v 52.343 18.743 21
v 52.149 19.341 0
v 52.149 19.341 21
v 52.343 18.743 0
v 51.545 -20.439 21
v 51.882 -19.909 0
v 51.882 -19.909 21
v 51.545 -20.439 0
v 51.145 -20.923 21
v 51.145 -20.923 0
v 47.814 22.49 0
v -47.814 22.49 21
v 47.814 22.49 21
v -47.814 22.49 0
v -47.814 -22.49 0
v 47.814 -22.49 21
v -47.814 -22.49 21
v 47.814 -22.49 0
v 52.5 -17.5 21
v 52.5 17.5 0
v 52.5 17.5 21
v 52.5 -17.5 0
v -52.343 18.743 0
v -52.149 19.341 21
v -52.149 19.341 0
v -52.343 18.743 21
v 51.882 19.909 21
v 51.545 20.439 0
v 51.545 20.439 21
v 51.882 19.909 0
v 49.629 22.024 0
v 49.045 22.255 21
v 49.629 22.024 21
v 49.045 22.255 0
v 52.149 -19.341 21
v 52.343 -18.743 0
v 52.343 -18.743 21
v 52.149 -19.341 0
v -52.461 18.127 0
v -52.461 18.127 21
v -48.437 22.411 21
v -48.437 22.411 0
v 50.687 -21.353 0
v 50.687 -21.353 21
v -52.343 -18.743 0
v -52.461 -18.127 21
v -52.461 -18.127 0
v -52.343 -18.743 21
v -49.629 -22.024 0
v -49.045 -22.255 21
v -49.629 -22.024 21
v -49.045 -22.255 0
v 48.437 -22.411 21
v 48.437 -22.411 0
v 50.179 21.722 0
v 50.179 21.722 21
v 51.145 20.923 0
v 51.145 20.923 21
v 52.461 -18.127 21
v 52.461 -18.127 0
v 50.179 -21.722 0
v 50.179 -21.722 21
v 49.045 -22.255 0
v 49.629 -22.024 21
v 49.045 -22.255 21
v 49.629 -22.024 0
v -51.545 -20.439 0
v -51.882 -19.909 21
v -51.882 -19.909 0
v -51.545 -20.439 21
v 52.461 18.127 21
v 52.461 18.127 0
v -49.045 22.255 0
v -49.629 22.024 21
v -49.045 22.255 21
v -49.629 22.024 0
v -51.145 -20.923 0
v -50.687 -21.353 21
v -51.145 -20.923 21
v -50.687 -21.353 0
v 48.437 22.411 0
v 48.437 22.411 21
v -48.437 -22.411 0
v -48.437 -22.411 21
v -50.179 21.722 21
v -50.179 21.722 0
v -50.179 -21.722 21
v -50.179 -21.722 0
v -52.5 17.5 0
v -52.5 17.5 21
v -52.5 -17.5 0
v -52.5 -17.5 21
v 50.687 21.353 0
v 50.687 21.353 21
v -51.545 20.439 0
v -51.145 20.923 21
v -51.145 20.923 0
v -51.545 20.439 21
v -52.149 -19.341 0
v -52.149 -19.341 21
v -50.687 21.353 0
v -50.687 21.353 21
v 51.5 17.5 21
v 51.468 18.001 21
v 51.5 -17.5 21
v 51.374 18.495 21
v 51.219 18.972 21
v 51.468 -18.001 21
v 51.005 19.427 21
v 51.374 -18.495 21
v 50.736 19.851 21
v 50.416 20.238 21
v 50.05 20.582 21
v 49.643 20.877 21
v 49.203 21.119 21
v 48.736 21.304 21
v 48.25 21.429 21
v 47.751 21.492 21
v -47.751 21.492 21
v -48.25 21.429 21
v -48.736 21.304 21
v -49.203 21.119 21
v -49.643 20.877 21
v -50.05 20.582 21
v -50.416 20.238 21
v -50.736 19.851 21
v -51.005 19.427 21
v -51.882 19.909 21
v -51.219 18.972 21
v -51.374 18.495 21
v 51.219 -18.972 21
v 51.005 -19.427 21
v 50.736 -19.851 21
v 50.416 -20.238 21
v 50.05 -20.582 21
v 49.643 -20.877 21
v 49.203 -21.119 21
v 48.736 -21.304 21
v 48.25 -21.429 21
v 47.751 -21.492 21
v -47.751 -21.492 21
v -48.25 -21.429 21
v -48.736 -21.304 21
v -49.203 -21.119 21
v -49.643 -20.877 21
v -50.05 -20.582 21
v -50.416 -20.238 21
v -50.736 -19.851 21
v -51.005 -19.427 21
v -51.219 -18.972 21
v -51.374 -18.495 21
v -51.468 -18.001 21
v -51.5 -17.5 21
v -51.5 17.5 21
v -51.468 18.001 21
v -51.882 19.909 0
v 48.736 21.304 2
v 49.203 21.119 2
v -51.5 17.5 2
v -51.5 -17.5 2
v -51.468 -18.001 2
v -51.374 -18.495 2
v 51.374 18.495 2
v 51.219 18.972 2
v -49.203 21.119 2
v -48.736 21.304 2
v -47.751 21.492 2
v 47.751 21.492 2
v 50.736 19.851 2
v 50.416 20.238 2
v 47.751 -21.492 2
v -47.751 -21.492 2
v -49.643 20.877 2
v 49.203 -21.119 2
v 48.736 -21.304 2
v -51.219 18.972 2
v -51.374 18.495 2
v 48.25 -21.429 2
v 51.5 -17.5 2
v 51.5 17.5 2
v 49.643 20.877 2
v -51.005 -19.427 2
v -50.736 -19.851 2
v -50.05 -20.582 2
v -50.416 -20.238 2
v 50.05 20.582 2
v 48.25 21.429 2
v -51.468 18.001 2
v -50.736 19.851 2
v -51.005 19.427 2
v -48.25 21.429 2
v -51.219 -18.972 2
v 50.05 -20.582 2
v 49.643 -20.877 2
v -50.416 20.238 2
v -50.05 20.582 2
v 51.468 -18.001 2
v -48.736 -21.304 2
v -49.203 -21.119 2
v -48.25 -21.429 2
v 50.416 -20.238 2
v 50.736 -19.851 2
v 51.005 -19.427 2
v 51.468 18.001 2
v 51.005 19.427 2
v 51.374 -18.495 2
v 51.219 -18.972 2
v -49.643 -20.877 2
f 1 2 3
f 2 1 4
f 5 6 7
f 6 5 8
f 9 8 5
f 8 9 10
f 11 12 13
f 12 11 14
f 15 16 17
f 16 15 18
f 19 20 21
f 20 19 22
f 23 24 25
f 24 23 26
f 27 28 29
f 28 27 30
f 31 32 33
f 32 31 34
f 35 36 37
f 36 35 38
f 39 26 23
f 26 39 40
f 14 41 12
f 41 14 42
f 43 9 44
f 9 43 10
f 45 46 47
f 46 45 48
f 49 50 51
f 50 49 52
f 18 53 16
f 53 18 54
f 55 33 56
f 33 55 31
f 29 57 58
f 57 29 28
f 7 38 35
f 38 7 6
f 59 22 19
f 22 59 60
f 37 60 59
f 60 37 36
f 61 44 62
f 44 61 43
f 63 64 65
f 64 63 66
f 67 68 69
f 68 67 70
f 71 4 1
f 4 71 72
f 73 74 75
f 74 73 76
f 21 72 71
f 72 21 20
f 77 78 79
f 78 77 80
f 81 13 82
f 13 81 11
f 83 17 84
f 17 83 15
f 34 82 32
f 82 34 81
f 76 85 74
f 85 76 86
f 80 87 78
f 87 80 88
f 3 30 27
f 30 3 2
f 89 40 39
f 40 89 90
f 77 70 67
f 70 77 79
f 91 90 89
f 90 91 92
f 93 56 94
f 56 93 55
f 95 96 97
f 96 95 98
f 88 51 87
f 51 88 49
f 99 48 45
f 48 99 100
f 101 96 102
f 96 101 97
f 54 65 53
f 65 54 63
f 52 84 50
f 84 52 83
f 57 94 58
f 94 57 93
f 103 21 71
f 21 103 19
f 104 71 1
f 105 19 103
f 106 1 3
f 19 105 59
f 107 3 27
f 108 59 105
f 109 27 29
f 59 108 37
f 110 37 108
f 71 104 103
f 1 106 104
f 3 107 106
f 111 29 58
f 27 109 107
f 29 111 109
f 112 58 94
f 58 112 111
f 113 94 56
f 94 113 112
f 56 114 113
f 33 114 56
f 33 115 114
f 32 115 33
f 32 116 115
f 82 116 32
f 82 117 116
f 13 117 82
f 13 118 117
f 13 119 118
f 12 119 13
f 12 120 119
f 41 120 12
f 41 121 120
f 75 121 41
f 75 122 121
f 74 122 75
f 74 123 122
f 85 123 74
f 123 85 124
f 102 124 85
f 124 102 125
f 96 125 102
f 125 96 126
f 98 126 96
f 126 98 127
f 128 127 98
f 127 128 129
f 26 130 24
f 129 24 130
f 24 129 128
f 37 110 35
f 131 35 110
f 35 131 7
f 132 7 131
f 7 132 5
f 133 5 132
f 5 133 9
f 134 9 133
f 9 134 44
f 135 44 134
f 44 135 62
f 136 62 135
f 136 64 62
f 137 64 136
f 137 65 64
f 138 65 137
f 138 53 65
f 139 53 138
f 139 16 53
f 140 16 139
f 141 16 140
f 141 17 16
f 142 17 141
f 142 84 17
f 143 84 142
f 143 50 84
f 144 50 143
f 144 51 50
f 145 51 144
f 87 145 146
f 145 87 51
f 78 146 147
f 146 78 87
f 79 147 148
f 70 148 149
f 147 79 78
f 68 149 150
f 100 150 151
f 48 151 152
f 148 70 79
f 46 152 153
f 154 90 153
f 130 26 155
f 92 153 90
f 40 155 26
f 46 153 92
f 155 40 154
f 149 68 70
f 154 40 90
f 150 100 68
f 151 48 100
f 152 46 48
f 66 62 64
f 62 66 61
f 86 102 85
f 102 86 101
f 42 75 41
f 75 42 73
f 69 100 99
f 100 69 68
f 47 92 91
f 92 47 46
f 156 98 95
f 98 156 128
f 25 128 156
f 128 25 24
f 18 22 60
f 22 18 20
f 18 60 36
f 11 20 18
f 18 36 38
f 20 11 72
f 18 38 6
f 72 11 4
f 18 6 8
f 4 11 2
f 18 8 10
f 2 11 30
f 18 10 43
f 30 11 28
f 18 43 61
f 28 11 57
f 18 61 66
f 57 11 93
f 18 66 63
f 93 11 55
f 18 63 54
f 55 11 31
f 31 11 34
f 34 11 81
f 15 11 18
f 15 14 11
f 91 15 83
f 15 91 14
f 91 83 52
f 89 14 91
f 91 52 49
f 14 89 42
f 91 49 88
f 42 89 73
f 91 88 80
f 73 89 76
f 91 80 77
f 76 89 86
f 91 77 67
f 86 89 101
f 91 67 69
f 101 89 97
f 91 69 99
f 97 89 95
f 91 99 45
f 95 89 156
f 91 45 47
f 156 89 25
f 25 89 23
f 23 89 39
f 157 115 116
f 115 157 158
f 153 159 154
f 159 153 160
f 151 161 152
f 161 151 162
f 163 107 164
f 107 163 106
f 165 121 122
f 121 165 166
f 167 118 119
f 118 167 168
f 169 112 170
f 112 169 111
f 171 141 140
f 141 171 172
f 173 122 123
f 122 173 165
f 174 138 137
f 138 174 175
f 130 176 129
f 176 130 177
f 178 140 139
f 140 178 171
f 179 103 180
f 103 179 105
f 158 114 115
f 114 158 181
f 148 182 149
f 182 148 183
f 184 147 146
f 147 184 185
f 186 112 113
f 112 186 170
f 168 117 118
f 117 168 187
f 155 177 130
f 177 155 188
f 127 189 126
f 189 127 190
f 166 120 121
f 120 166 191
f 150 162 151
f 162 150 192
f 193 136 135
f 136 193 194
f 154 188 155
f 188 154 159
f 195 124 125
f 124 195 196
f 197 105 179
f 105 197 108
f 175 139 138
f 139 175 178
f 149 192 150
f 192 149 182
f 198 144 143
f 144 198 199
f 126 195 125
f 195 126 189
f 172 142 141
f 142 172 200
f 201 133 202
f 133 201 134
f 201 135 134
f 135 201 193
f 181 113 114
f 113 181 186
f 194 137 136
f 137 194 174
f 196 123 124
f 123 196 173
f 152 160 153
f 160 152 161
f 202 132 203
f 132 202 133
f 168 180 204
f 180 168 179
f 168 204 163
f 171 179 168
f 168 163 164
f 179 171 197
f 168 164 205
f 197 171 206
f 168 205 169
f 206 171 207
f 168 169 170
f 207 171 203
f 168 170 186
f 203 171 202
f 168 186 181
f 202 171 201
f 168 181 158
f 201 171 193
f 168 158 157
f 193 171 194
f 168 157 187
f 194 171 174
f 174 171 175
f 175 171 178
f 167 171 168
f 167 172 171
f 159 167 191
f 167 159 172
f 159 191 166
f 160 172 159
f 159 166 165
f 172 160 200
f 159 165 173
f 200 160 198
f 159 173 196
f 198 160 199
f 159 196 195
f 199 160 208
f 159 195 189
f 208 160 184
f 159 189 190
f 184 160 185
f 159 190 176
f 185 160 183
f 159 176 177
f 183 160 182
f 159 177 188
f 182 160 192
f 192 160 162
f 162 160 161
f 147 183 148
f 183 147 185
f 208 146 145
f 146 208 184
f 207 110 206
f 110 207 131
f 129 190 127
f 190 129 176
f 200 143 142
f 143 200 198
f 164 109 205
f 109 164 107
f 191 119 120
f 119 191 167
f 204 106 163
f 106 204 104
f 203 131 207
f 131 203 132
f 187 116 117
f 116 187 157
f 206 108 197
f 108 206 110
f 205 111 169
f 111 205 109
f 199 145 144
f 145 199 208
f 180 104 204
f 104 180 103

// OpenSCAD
$fn = 50;


difference() {
	union() {
		hull() {
			translate(v = [-47.5000000000, 17.5000000000, 0]) {
				cylinder(h = 21, r = 5);
			}
			translate(v = [47.5000000000, 17.5000000000, 0]) {
				cylinder(h = 21, r = 5);
			}
			translate(v = [-47.5000000000, -17.5000000000, 0]) {
				cylinder(h = 21, r = 5);
			}
			translate(v = [47.5000000000, -17.5000000000, 0]) {
				cylinder(h = 21, r = 5);
			}
		}
	}
	union() {
		translate(v = [0, 0, 2]) {
			hull() {
				translate(v = [-47.5000000000, 17.5000000000, 0]) {
					cylinder(h = 19, r = 4);
				}
				translate(v = [47.5000000000, 17.5000000000, 0]) {
					cylinder(h = 19, r = 4);
				}
				translate(v = [-47.5000000000, -17.5000000000, 0]) {
					cylinder(h = 19, r = 4);
				}
				translate(v = [47.5000000000, -17.5000000000, 0]) {
					cylinder(h = 19, r = 4);
				}
			}
		}
	}
}
